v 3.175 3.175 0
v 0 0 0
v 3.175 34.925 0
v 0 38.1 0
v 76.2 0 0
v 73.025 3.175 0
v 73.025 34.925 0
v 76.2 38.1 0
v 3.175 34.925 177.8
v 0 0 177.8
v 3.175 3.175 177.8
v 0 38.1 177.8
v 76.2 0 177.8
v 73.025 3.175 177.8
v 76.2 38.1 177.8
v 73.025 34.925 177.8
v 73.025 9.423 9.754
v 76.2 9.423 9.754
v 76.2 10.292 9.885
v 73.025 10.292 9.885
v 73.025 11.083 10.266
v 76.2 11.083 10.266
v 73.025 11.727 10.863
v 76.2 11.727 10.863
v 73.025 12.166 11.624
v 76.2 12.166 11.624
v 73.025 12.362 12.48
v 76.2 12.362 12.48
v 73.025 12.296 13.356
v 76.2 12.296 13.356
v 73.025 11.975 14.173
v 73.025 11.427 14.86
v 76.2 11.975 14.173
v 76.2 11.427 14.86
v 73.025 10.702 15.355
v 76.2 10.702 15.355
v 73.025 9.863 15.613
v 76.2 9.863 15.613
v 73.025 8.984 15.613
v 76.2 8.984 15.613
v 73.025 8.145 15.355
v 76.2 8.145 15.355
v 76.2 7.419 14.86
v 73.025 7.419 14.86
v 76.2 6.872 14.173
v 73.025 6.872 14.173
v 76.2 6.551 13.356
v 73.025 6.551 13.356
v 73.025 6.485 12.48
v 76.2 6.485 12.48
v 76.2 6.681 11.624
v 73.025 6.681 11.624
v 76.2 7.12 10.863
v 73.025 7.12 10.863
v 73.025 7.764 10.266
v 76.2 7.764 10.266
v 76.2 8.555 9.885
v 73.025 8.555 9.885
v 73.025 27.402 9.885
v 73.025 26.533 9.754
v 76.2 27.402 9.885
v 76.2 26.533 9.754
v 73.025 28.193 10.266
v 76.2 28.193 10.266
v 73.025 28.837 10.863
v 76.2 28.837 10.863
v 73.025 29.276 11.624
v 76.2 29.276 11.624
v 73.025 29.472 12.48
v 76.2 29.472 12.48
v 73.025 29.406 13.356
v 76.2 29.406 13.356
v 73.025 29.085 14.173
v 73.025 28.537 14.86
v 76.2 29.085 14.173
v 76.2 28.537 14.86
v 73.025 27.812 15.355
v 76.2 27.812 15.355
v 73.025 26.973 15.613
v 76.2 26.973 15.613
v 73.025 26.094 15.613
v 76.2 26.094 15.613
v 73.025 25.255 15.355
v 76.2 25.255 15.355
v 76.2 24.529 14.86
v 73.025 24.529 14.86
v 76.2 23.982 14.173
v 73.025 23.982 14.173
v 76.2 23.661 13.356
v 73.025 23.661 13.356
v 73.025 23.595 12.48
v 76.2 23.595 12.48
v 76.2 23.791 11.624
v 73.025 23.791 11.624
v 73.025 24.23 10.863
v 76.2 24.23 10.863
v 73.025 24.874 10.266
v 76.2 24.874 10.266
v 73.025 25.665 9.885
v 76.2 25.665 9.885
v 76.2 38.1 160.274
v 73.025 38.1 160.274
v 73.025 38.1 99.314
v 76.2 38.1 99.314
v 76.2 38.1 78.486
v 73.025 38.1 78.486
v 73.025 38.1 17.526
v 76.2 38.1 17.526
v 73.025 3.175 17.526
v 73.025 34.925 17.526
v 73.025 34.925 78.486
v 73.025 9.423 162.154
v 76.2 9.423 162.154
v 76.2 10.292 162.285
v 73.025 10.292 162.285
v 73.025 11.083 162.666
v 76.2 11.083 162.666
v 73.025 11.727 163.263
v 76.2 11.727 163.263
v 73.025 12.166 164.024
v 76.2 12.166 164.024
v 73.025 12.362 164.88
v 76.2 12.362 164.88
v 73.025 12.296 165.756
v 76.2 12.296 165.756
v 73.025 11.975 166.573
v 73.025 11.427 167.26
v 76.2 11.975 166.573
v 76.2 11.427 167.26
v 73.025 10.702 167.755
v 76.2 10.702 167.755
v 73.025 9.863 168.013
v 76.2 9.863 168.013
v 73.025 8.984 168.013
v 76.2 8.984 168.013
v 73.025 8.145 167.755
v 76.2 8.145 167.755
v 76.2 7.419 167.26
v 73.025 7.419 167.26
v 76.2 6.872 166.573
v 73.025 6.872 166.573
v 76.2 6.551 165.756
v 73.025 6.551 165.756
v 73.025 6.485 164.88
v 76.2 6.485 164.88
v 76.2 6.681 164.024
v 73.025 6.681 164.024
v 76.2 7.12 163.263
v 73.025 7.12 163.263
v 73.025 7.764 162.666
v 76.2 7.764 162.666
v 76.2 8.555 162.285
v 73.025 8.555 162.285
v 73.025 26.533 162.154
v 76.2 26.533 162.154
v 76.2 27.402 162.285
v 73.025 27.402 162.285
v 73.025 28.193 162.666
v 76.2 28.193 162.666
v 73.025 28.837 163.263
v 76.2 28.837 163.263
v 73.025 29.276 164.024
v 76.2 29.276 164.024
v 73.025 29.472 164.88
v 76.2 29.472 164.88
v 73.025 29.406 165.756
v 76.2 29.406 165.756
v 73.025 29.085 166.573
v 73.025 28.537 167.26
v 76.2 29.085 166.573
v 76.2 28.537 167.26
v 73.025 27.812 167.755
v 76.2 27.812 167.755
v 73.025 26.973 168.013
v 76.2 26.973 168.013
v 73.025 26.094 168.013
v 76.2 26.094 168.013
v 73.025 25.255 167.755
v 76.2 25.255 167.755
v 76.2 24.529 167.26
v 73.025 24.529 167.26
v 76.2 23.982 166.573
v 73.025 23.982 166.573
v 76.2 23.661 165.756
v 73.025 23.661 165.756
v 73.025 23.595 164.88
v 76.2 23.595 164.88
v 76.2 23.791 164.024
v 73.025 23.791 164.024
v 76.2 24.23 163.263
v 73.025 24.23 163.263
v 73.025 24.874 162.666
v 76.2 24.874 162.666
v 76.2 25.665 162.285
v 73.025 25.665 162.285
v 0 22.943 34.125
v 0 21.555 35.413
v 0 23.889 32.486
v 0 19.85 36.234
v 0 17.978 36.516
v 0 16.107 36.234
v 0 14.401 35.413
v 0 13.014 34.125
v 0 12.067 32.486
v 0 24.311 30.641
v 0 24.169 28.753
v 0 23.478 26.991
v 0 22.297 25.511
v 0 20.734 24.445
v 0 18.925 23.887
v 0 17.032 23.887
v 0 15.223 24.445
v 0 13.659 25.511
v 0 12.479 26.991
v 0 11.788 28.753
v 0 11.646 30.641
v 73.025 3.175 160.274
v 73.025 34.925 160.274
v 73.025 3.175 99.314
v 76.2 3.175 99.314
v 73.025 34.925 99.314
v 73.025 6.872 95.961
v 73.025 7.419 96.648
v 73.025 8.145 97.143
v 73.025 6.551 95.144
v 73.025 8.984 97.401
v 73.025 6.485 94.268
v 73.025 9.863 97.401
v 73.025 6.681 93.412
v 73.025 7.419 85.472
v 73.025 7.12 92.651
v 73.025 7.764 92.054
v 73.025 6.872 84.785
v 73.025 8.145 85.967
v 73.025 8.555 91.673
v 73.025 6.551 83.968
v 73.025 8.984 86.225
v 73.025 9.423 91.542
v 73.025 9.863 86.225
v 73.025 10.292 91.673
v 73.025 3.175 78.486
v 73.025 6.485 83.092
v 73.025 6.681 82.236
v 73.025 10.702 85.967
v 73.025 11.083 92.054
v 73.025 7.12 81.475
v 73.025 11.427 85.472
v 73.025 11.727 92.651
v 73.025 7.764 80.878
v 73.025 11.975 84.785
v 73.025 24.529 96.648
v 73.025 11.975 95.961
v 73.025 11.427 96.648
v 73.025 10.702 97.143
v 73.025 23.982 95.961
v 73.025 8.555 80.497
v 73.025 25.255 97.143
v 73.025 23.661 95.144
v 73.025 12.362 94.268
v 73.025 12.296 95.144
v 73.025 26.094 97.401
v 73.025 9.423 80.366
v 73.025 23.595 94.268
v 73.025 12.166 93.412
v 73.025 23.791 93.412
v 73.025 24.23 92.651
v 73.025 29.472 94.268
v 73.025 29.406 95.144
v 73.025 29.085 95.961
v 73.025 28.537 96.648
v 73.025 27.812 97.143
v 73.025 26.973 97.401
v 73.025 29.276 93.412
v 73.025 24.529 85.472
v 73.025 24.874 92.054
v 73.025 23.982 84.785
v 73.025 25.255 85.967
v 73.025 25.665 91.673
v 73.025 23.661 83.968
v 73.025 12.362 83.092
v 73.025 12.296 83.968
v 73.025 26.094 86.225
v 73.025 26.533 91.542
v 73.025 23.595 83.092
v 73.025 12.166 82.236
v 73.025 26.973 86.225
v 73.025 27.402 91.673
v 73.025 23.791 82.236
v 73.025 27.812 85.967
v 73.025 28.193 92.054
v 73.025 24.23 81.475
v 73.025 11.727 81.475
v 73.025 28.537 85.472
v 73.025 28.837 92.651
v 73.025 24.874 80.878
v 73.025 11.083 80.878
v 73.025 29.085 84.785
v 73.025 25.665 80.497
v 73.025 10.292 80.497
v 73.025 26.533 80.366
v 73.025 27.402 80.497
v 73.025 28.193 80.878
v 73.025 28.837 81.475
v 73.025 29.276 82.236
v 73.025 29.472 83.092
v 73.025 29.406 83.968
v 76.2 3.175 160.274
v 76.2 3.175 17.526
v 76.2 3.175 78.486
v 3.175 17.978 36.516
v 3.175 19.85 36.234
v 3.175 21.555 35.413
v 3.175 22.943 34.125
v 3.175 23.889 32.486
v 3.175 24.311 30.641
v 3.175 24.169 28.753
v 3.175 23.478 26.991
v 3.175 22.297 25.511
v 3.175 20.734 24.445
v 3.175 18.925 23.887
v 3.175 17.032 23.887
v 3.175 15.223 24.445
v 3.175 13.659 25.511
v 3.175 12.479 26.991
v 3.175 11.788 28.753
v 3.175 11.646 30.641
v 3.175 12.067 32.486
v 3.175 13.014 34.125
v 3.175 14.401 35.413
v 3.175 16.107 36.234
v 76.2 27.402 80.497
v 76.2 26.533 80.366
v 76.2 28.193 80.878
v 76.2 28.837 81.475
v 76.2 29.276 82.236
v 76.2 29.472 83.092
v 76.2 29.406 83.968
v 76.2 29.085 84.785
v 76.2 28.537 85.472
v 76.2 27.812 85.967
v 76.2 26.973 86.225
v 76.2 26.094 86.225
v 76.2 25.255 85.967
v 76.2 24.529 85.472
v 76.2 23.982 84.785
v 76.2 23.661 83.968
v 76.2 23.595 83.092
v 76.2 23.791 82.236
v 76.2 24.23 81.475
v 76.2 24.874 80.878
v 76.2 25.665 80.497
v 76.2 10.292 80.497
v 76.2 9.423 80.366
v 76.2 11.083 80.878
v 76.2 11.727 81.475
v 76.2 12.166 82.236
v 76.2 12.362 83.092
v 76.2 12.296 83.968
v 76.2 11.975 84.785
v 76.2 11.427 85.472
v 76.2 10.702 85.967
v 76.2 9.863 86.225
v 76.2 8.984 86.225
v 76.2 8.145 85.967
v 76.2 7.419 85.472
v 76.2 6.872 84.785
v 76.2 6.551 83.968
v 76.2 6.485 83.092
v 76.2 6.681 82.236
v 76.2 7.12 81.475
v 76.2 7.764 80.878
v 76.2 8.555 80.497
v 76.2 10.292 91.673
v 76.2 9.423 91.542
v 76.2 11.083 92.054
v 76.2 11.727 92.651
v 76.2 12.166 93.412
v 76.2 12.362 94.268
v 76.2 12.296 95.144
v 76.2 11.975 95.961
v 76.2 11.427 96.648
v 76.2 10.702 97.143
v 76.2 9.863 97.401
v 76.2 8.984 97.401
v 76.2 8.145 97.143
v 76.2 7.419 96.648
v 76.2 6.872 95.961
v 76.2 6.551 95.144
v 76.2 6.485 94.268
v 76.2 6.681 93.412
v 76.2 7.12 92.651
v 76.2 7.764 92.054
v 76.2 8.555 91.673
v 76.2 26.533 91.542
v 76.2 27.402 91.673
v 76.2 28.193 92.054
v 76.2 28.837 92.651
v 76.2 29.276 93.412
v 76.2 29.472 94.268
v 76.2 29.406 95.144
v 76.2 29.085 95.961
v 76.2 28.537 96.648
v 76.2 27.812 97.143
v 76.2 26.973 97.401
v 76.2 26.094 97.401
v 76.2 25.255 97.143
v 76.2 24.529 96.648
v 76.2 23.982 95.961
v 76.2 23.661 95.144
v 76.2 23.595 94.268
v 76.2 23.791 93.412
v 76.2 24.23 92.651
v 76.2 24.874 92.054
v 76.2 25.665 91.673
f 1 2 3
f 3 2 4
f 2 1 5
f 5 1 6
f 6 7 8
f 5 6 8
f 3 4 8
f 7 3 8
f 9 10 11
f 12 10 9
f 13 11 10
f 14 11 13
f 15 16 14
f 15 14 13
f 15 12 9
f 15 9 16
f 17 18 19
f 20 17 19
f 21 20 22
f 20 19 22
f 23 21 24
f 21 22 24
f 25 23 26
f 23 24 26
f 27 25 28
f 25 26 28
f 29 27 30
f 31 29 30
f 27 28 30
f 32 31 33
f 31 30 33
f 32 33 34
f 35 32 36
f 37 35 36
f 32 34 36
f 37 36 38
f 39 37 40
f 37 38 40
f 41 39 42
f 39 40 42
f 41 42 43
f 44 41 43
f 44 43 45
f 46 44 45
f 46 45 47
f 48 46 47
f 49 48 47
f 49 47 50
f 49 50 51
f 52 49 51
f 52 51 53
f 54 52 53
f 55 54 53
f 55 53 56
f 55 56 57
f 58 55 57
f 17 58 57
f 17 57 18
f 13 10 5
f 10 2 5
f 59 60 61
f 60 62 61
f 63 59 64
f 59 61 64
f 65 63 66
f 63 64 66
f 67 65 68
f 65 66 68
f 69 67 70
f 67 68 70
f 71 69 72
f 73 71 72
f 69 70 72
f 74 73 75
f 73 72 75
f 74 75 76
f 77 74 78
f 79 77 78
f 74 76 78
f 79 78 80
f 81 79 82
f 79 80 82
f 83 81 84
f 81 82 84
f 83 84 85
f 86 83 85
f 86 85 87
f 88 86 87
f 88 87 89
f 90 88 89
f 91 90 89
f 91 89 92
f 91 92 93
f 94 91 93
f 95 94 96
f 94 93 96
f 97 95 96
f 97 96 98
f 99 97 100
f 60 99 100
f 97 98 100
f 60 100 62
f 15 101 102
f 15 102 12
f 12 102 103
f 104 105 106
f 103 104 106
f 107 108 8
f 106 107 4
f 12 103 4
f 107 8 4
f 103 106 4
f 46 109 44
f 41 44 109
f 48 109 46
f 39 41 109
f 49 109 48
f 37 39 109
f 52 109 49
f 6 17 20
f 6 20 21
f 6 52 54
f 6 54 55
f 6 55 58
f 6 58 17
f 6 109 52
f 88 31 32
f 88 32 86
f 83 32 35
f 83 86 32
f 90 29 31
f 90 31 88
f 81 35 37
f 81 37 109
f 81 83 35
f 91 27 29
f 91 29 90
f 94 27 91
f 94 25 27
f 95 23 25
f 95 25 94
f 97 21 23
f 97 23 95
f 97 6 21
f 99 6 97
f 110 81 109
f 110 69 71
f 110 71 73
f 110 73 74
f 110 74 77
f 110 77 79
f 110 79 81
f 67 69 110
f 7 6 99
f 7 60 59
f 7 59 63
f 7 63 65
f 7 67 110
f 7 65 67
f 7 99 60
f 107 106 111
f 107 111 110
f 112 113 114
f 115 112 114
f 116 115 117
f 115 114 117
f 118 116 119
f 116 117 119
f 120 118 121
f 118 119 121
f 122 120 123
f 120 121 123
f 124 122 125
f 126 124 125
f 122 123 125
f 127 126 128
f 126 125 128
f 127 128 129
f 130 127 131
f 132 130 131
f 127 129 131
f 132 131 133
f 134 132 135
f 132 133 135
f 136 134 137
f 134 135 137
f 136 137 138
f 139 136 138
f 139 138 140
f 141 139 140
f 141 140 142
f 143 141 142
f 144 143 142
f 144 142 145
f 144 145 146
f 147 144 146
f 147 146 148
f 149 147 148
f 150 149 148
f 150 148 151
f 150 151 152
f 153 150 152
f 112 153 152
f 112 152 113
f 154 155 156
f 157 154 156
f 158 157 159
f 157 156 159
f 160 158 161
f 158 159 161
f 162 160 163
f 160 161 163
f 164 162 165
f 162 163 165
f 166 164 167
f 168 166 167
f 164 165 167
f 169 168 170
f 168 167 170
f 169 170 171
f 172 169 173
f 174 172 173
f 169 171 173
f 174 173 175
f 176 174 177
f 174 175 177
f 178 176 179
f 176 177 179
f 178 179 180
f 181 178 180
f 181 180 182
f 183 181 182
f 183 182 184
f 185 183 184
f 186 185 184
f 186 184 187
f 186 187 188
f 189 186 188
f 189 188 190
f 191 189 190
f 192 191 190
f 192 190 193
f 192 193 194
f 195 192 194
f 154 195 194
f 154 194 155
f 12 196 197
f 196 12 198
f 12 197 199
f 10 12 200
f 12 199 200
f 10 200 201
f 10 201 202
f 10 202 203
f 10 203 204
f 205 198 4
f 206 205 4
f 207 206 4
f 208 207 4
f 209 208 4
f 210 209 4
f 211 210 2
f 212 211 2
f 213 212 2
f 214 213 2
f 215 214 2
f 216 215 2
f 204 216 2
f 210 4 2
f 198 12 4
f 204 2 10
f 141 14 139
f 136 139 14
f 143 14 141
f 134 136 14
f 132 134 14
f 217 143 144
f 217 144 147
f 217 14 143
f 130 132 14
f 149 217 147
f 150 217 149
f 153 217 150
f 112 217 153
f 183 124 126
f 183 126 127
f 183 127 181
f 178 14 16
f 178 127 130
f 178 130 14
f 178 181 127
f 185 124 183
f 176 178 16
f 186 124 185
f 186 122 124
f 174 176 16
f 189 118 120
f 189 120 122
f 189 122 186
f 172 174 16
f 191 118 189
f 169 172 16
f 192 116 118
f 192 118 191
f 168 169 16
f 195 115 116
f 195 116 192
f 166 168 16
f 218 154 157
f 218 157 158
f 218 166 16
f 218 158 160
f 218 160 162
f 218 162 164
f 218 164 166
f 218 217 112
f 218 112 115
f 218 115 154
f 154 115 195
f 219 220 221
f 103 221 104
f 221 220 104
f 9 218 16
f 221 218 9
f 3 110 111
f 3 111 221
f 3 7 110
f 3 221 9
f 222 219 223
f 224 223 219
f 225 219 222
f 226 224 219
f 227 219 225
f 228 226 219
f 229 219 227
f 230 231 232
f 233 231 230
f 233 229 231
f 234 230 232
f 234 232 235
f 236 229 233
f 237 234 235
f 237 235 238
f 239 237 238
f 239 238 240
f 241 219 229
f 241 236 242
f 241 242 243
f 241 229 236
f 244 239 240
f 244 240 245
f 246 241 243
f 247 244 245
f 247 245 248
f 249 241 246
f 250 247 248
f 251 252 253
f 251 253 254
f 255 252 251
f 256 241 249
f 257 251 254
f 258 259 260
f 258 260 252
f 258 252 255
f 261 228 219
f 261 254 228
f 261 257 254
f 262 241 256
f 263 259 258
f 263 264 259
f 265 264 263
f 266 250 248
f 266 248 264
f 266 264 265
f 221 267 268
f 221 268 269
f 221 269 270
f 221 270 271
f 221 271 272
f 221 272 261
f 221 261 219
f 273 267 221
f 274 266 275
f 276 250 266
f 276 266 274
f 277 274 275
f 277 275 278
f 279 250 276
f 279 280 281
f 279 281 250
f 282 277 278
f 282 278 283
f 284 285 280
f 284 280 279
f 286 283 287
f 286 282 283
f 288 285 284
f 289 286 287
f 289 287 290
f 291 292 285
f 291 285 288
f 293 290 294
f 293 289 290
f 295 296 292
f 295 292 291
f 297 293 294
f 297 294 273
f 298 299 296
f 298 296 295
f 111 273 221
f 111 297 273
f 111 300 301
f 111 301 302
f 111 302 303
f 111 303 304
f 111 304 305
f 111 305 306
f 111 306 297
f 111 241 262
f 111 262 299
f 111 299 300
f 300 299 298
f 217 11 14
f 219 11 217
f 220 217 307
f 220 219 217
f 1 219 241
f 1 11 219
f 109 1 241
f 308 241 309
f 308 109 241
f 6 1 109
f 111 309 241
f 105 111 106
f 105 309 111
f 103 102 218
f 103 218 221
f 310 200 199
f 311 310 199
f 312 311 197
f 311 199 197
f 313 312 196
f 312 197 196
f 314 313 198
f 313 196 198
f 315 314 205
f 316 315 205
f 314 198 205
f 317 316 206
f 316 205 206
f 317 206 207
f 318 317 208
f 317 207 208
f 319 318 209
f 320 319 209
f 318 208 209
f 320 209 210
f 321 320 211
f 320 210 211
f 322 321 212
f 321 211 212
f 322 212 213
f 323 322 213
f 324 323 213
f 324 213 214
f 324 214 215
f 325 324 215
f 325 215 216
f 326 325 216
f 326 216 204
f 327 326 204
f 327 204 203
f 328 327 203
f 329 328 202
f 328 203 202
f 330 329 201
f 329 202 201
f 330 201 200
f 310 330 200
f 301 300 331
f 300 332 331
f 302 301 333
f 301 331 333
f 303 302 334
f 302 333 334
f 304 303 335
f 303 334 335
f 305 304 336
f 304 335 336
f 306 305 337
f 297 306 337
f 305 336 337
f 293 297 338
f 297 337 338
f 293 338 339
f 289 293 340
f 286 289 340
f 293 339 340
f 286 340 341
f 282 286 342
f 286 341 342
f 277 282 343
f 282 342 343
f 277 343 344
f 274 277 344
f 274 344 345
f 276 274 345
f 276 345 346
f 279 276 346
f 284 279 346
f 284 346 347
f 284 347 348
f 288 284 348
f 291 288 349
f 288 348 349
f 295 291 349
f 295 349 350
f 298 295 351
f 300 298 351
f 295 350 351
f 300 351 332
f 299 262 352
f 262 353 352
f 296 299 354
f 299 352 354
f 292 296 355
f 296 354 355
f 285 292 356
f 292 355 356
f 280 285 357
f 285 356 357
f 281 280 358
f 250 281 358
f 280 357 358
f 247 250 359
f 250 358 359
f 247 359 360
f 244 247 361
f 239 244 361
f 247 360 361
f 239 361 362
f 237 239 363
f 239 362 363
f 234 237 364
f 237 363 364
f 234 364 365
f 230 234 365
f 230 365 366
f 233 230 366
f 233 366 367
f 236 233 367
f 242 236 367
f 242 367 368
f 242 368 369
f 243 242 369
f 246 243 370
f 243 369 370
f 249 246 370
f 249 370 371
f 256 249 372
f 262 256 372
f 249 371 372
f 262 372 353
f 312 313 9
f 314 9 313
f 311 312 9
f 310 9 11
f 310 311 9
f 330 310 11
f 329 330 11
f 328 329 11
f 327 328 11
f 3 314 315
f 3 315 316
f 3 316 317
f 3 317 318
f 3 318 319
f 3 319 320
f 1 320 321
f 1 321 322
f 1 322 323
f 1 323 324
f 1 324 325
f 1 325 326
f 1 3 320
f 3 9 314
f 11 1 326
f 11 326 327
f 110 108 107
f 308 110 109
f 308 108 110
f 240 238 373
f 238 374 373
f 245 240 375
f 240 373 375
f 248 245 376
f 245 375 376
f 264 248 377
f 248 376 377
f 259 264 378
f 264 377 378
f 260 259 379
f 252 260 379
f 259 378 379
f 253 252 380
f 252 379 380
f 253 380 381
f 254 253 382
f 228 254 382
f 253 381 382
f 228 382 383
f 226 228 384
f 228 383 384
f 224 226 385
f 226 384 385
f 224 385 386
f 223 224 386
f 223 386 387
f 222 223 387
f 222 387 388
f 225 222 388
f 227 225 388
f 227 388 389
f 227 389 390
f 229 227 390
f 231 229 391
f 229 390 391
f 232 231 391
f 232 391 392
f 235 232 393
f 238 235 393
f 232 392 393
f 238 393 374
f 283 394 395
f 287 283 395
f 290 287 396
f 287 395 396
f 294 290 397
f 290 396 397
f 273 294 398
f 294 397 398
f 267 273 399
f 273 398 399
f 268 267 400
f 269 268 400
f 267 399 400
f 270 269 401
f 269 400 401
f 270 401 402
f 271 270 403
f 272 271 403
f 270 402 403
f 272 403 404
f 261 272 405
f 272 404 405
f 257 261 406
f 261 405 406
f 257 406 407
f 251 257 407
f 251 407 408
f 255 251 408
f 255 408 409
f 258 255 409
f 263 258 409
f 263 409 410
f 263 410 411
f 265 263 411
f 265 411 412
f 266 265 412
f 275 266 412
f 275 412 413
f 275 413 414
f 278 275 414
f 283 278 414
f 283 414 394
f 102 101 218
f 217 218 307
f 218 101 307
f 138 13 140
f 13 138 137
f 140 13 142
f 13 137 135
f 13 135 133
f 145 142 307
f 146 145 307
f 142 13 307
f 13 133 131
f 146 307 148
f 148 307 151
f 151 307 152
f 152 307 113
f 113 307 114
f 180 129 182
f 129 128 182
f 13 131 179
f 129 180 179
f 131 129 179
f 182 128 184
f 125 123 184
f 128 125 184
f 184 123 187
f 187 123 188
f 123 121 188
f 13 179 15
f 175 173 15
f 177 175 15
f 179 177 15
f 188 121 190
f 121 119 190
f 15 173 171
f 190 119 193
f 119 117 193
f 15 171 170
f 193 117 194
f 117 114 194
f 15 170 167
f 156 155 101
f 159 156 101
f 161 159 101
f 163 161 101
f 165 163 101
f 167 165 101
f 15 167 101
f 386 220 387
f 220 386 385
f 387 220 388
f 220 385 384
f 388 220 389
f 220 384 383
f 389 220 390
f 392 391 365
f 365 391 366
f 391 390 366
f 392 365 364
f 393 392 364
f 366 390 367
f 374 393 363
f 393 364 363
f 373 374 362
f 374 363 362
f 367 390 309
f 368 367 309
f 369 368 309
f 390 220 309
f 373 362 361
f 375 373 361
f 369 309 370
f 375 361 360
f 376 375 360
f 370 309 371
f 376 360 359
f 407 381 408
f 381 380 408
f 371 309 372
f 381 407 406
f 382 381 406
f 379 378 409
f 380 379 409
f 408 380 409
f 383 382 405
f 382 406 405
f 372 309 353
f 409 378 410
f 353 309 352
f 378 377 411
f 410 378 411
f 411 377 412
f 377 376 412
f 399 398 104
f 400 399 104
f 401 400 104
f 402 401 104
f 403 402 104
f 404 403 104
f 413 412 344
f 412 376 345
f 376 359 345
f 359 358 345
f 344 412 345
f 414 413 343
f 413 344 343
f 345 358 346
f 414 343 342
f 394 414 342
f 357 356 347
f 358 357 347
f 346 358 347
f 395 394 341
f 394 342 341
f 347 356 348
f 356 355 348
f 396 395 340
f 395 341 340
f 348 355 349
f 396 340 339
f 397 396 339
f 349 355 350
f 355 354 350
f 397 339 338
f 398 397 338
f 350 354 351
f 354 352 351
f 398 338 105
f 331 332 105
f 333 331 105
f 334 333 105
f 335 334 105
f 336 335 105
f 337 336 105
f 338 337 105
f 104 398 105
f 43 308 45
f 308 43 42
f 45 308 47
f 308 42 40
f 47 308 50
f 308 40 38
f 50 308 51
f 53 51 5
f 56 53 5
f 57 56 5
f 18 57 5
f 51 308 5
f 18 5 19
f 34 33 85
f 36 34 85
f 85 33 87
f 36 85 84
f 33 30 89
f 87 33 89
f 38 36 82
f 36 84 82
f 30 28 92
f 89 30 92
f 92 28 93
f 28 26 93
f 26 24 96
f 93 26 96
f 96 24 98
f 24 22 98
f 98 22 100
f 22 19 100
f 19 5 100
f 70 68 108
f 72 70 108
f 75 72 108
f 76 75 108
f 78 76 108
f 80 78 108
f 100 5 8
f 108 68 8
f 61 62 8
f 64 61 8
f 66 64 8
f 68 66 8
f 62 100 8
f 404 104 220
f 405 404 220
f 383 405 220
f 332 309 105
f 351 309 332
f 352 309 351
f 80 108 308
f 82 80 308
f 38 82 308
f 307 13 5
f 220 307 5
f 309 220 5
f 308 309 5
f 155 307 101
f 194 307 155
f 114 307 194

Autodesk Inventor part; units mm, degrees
ref_plane "YZ Plane" through (0, 0, 0) normal (1, 0, 0) x (0, 1, 0)
ref_plane "XZ Plane" through (0, 0, 0) normal (0, 1, 0) x (-1, 0, 0)
ref_plane "XY Plane" through (0, 0, 0) normal (0, 0, 1) x (1, 0, 0)
sketch "Sketch2" plane through (0, 0, 0) normal (0, 0, 1) x (1, 0, 0)
  line L0 (0, 0) -> (76.2, 0)
  line L1 (76.2, 0) -> (76.2, 38.1)
  line L2 (0, 38.1) -> (0, 0)
  line L3 (76.2, 38.1) -> (0, 38.1)
  dimension "d0" = 76.2
  dimension "d1" = 38.1
extrude "Extrusion_channel" add sketch "Sketch2" along normal blind 177.8
sketch "Sketch3" plane through (76.2, 0, 0) normal (1, 0, 0) x (0, 0, -1)
  circle A0 centre (-12.7, 9.4234) radius 2.9464
  circle A1 centre (-12.7, 26.5334) radius 2.9464
  line L0 (0, 0) -> (-177.8, 0) projected
  line L1 (0, 0) -> (0, 38.1) projected
  circle A2 centre (-83.312, 9.4234) radius 2.9464
  circle A3 centre (-83.312, 26.5334) radius 2.9464
  line L2 (-78.486, 38.1) -> (-17.526, 38.1)
  line L3 (-17.526, 38.1) -> (-17.526, 3.175)
  line L4 (-17.526, 3.175) -> (-78.486, 3.175)
  line L5 (-78.486, 3.175) -> (-78.486, 38.1)
  line L6 (-78.486, 38.1) -> (-17.526, 3.175) construction
  line L7 (-17.526, 38.1) -> (-78.486, 3.175) construction
  line L8 (0, 38.1) -> (-177.8, 38.1) projected
  line L9 (-88.9, 38.1) -> (-88.9, 0)
  circle A4 centre (-165.1, 9.4234) radius 2.9464
  circle A5 centre (-165.1, 26.5334) radius 2.9464
  line L10 (-177.8, 0) -> (-177.8, 38.1)
  circle A6 centre (-94.488, 9.4234) radius 2.9464
  circle A7 centre (-94.488, 26.5334) radius 2.9464
  line L11 (-99.314, 38.1) -> (-160.274, 38.1)
  line L12 (-160.274, 38.1) -> (-160.274, 3.175)
  line L13 (-160.274, 3.175) -> (-99.314, 3.175)
  line L14 (-99.314, 3.175) -> (-99.314, 38.1)
  line L15 (-99.314, 38.1) -> (-160.274, 3.175) construction
  line L16 (-160.274, 38.1) -> (-99.314, 3.175) construction
  point P0 (-48.006, 20.6375)
  point P1 (-129.794, 20.6375)
  dimension "d9" = 5.8928
  dimension "d10" = 5.8928
  dimension "d11" = 9.4234
  dimension "d12" = 17.11
  dimension "d13" = 12.7
  dimension "d14" = 5.8928
  dimension "d15" = 5.8928
  dimension "d16" = 70.612
  dimension "d17" = 60.96
  dimension "d18" = 34.925
  dimension "d19" = 35.306
  dimension "d20" = 3.175
extrude "Extrusion_mount" cut sketch "Sketch3" against normal blind 3.175 contours A0 | A1 | L3 L4 L5 L2 | L14 L13 L12 L8 | A2 | A3 | A4 | A5 | A6 | A7
sketch "Sketch8" plane through (0, 0, 0) normal (-1, 0, 0) x (0, 0, 1)
  line L0 (0, 0) -> (177.8, 0) projected
  line L1 (88.9, 0) -> (169.037, 38.1)
  line L2 (78.486, 38.1) -> (177.8, 38.1) projected
  circle A0 centre (30.166, 17.9784) radius 6.35
  line L3 (0, 38.1) -> (0, 0) projected
  circle A1 centre (65.7664, -56.9012) radius 6.35
  point P0 (99.314, 38.1)
  point P1 (160.274, 38.1)
  dimension "d26" = 12.7
  dimension "d27" = 17.9784
  dimension "d28" = 30.166
extrude "Extrusion_hole" cut sketch "Sketch8" against normal blind 3.175
sketch "Sketch9" plane through (0, 0, 0) normal (0, 0, -1) x (-1, 0, 0)
  line L0 (-3.175, 3.175) -> (-73.025, 3.175)
  line L1 (-73.025, 3.175) -> (-73.025, 34.925)
  line L2 (-73.025, 34.925) -> (-3.175, 34.925)
  line L3 (-3.175, 34.925) -> (-3.175, 3.175)
  point P0 (0, 0)
  dimension "d32" = 3.175
  dimension "d33" = 3.175
  dimension "d34" = 69.85
  dimension "d35" = 31.75
extrude "Extrusion_tube" cut sketch "Sketch9" against normal up to next
equation "\"d0\" = o_width"
equation "\"d1\" = height"
equation "\"d7\" = length"
equation "\"d9\" = hole_dia"
equation "\"d10\" = hole_dia"
equation "\"d11\" = hole_height"
equation "\"d12\" = hole_spacing"
equation "\"d13\" = end_space"
equation "\"d14\" = hole_dia"
equation "\"d15\" = hole_dia"
equation "\"d16\" = mount_spacing"
equation "\"d17\" = servo_space"
equation "\"d18\" = height - thickness"
equation "\"d19\" = 0.5 * mount_spacing"
equation "\"d20\" = thickness"
equation "\"d21\" = thickness"
equation "\"d26\" = mount_dia"
equation "\"d27\" = 0.5 * hole_spacing + hole_height"
equation "\"d28\" = servo_axis + end_space"
equation "\"d29\" = thickness"
equation "\"d32\" = thickness"
equation "\"d33\" = thickness"
equation "\"d34\" = o_width - 2 * thickness"
equation "\"d35\" = height - 2 * thickness"
equation "\"length\" = 177.8"
equation "\"o_width\" = 76.2"
equation "\"thickness\" = 3.175"
equation "\"i_width\" = o_width - 2 * thickness"
equation "\"height\" = 0.5 * o_width"
equation "\"servo_space\" = 60.96"
equation "\"mount_spacing\" = 70.612"
equation "\"hole_dia\" = 5.8928"
equation "\"end_space\" = 12.7"
equation "\"hole_spacing\" = 17.11"
equation "\"servo_axis\" = 17.466"
equation "\"mount_dia\" = 12.7"
equation "\"hole_height\" = 9.4234"
properties part number "upper_leg"
